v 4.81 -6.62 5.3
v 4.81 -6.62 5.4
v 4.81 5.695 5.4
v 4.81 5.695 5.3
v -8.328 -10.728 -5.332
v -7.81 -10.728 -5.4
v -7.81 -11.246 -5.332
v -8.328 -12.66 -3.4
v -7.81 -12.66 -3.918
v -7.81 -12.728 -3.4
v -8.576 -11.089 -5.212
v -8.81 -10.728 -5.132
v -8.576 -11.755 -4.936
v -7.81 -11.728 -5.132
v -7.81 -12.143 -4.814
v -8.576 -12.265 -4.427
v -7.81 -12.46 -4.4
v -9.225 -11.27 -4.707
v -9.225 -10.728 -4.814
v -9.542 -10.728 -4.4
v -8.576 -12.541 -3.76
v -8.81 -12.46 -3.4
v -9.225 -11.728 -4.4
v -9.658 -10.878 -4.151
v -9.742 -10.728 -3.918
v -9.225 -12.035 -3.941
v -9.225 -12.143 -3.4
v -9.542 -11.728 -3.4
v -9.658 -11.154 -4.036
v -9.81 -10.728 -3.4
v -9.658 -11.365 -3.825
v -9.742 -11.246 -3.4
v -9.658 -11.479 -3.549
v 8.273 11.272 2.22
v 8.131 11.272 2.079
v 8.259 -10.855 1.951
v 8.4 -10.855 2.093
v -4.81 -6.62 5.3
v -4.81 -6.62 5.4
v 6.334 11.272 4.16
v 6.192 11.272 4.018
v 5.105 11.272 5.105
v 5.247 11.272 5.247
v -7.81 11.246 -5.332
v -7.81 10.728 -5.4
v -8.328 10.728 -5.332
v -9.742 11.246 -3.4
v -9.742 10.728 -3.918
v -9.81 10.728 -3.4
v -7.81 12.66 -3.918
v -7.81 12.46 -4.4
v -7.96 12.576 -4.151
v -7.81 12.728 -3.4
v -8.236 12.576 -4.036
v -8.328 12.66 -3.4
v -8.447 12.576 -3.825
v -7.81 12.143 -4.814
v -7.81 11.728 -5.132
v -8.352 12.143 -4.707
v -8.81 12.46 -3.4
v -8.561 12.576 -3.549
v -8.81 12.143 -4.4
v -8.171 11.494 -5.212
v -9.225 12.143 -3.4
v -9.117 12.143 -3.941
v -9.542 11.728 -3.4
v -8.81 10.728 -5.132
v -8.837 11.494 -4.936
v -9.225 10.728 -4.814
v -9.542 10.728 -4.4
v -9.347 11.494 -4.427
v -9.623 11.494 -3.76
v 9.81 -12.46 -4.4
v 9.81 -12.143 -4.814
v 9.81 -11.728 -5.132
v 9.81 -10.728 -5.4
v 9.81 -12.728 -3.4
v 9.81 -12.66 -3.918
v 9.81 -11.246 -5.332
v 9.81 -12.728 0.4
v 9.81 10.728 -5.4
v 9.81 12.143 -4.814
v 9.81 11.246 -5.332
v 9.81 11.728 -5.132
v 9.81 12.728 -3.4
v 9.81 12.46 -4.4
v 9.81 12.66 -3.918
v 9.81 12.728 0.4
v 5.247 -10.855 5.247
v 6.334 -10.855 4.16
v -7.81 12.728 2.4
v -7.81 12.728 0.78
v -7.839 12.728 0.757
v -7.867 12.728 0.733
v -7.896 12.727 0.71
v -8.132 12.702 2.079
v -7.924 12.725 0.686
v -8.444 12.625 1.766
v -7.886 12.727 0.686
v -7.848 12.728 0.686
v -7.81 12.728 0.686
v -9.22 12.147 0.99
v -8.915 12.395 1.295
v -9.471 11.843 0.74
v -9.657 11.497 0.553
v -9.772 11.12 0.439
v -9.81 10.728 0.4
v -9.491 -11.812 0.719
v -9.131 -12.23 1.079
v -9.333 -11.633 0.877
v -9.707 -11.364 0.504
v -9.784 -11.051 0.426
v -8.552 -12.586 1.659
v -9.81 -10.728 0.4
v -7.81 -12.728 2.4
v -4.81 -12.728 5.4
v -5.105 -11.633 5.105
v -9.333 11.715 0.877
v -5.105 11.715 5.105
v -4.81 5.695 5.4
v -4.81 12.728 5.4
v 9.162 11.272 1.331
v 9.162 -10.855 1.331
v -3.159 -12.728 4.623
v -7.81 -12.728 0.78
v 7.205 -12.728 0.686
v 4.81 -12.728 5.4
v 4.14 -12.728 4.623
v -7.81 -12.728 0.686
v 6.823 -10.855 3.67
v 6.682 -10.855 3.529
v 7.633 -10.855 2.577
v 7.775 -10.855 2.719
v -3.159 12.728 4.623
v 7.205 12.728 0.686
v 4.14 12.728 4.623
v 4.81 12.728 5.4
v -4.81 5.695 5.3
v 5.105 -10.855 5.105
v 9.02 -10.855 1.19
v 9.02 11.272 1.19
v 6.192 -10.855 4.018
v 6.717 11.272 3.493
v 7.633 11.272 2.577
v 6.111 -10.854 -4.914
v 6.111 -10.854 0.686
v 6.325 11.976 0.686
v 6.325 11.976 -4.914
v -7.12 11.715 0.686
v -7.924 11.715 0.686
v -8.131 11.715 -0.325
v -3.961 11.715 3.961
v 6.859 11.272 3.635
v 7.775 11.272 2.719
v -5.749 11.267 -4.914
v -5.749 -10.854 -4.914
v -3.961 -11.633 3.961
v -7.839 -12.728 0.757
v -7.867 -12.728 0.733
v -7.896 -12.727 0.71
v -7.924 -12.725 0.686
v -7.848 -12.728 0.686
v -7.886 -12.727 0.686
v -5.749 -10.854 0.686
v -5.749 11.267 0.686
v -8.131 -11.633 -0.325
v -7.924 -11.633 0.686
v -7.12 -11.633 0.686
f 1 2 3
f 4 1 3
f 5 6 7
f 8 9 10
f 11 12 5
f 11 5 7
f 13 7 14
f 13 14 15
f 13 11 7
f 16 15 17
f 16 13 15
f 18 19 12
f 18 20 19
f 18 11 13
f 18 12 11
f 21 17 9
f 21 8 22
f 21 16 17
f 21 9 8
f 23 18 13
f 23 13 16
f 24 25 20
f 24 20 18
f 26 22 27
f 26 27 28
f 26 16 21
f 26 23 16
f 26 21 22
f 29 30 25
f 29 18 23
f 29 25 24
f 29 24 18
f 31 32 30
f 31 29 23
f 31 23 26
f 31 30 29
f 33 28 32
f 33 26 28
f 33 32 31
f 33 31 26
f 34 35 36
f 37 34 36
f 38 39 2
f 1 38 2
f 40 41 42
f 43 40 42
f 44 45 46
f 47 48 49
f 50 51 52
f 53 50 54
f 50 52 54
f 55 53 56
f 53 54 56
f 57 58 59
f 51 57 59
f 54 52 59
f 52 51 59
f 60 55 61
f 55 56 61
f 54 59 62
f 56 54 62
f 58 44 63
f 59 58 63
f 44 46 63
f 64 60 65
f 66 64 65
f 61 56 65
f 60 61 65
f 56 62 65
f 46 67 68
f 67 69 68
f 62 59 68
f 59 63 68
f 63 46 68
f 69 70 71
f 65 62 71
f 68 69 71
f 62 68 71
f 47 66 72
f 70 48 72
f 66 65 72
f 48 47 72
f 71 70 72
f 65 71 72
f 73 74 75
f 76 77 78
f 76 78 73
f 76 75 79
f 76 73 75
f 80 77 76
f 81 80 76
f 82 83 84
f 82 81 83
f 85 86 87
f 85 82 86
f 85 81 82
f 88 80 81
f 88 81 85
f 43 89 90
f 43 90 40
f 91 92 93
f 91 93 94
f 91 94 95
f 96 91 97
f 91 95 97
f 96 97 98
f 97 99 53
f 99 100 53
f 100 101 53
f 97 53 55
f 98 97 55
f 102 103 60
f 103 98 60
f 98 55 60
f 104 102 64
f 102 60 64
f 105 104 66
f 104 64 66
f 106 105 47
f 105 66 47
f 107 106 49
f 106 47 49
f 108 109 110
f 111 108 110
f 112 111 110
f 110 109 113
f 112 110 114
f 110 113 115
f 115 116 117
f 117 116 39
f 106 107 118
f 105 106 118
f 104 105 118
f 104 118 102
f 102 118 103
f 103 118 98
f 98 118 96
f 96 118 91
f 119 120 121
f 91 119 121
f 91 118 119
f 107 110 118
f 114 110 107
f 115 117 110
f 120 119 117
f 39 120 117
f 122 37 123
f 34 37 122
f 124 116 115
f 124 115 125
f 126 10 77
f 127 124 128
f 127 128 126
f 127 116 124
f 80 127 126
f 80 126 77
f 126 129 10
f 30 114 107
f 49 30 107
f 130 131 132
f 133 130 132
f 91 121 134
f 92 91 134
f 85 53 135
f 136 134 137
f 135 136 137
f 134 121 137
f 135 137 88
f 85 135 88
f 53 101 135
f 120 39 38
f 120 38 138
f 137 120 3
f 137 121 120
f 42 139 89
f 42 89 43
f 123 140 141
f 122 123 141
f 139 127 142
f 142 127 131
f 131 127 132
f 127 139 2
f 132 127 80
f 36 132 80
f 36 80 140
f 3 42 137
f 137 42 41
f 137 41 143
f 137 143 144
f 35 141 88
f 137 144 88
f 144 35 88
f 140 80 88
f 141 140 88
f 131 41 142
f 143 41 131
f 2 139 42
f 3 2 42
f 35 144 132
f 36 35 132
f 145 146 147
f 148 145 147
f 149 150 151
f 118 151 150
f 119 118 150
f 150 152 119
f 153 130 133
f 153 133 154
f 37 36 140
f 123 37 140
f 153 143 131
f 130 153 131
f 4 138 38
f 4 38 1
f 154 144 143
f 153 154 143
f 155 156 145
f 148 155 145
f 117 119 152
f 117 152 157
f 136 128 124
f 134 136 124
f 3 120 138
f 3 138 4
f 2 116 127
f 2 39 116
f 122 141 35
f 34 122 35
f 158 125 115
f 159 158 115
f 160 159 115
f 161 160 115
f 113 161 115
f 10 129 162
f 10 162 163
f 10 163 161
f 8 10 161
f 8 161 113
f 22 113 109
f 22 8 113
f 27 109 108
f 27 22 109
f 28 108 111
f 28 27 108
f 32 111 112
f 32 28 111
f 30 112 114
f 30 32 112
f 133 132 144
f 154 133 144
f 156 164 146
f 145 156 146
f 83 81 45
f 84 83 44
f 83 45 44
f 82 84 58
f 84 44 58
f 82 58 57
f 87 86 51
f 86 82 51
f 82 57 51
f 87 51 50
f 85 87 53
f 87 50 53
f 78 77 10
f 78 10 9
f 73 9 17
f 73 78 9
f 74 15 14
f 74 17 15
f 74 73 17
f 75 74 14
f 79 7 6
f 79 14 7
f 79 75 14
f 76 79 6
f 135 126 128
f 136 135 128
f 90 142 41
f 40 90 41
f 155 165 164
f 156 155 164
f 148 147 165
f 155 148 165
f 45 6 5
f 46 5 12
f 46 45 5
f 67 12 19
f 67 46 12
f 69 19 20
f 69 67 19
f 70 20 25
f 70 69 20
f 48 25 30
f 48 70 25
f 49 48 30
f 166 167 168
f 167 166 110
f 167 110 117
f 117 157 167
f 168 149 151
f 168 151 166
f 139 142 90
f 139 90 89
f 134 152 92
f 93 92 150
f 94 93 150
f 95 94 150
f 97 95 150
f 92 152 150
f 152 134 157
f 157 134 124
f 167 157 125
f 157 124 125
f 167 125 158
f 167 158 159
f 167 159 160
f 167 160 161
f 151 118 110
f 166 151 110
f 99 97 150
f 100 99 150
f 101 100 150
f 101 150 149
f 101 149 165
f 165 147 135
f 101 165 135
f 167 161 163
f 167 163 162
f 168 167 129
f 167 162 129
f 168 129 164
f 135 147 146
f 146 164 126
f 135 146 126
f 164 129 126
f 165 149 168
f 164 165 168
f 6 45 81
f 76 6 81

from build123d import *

# Parameters (mm, degrees)
F0_W         = 19.62069033
F0_H         = 25.4568966
F1_DEPTH     = 5.4
F2_SIZE      = 5
F3_SIZE      = 5
F4_W         = 22.1276450902
F4_H         = 1.5373004135
F5_DEPTH     = 0.2
F7_DEPTH     = 25.5
F8_W         = 23.348543793
F8_H         = 5.9792976826
F9_DEPTH     = 1.7
F10_R        = 2
F11_T1_DEPTH = 28.4568966
F11_T3_DEPTH = 8.8
F11_T6_ANGLE = 90
F12_T1_DEPTH = 22.62069033
F12_T3_DEPTH = 8.8
F12_T6_ANGLE = 90.0000000053
F14_DEPTH    = 5.6
F15_W        = 9.62069033
F15_H        = 12.3144993559
F16_DEPTH    = 0.1


# Not quite as in the source:
# - a fillet or chamfer that OpenCascade refuses, or shapes differently, is made with other operations: its cross-section is extruded or revolved along the edge and cut away or added


with BuildPart() as f1:
    # F0 (on Top) → F1 (new body, symmetric)
    with BuildSketch(Plane.XY):
        Rectangle(F0_W, F0_H)
    extrude(amount=F1_DEPTH, both=True)

    # F2
    f2_edges = [f1.edges().sort_by_distance(p)[0] for p in [
        (-9.810345, 0, 5.4),
    ]]
    chamfer(f2_edges, length=F2_SIZE)

    # F3
    f3_edges = [f1.edges().sort_by_distance(p)[0] for p in [
        (9.810345, 0, 5.4),
    ]]
    chamfer(f3_edges, length=F3_SIZE)

    # F4 (on face) → F5 (join)
    with BuildSketch(Plane(origin=(5.1051725825, 0, 5.1051725825), x_dir=(0, 1, 0), z_dir=(0.7071067812, 0, 0.7071067812))):
        with Locations((0.2083815634, -0.7686502067)):
            Rectangle(F4_W, F4_H)
        Polygon((11.2722041085, -2.2796541452), (-10.8554409817, -2.2294183727), (-10.8554409817, -3.5751299001), (11.2722041085, -3.5751299001), align=None)
        Polygon((11.2722041085, -4.2798109353), (-10.8554409817, -4.4601280242), (-10.8554409817, -5.5370246992), (11.2722041085, -5.5370246992), align=None)
    extrude(amount=F5_DEPTH)

    # F6 (on face) → F7 (cut)
    with BuildSketch(Plane.XZ.offset(12.7284483)):
        Polygon((4.140063189, 4.6230903827), (-3.1588820275, 4.6230903827), (-7.9239970073, 0.6864351453), (7.2048916481, 0.6864351453), align=None)
    extrude(amount=-F7_DEPTH, mode=Mode.SUBTRACT)

    # F8 (on face) → F9 (cut)
    with BuildSketch(Plane(origin=(-5.1051725825, 0, 5.1051725825), x_dir=(0, -1, 0), z_dir=(-0.7071067812, 0, 0.7071067812))):
        with Locations((-0.0411020592, -2.9896488413)):
            Rectangle(F8_W, F8_H)
    extrude(amount=-F9_DEPTH, mode=Mode.SUBTRACT)

    # F10
    f10_edges = [f1.edges().sort_by_distance(p)[0] for p in [
        (0, -12.728448, -5.4),
    ]]
    fillet(f10_edges, radius=F10_R)

    # F11: fillet of radius 2 on 1 edges, made by hand

    # F11_s2 → F11_t1 (cut)
    with BuildSketch(Plane.XZ.offset(-17.7284483)):
        with BuildLine():
            ThreePointArc((-7.810345165, -5.4), (-9.2245587274, -4.8142135624), (-9.810345165, -3.4))
            Line((-9.810345165, -3.4), (-9.810345165, -5.4))
            Line((-9.810345165, -5.4), (-7.810345165, -5.4))
        make_face()
    extrude(amount=F11_T1_DEPTH, mode=Mode.SUBTRACT)

    # F11_s4 → F11_t3 (cut)
    with BuildSketch(Plane.XY.offset(-3.4)):
        with BuildLine():
            ThreePointArc((-7.810345165, -12.7284483), (-9.2245587274, -12.1426618624), (-9.810345165, -10.7284483))
            Line((-9.810345165, -10.7284483), (-9.810345165, -12.7284483))
            Line((-9.810345165, -12.7284483), (-7.810345165, -12.7284483))
        make_face()
    extrude(amount=F11_T3_DEPTH, mode=Mode.SUBTRACT)

    # F11_s5 → F11_t6 (revolve, cut)
    with BuildSketch(Plane.XZ.offset(10.7284483)):
        with BuildLine():
            ThreePointArc((-7.810345165, -5.4), (-9.2245587274, -4.8142135624), (-9.810345165, -3.4))
            Line((-9.810345165, -3.4), (-9.810345165, -5.4))
            Line((-9.810345165, -5.4), (-7.810345165, -5.4))
        make_face()
    revolve(axis=Axis((-9.810345165, -10.7284483, -3.4), (-1, 0, 0)), revolution_arc=F11_T6_ANGLE, mode=Mode.SUBTRACT)

    # F12: fillet of radius 2 on 1 edges, made by hand

    # F12_s2 → F12_t1 (cut)
    with BuildSketch(Plane.YZ.offset(-7.810345165)):
        with BuildLine():
            ThreePointArc((10.7284483, -5.4), (12.1426618624, -4.8142135624), (12.7284483, -3.4))
            Line((12.7284483, -3.4), (12.7284483, -5.4))
            Line((12.7284483, -5.4), (10.7284483, -5.4))
        make_face()
    extrude(amount=F12_T1_DEPTH, mode=Mode.SUBTRACT)

    # F12_s4 → F12_t3 (cut)
    with BuildSketch(Plane.XY.offset(-3.4)):
        with BuildLine():
            ThreePointArc((-7.810345165, 12.7284483), (-9.2245587274, 12.1426618624), (-9.810345165, 10.7284483))
            Line((-9.810345165, 10.7284483), (-9.810345165, 12.7284483))
            Line((-9.810345165, 12.7284483), (-7.810345165, 12.7284483))
        make_face()
    extrude(amount=F12_T3_DEPTH, mode=Mode.SUBTRACT)

    # F12_s5 → F12_t6 (revolve, cut)
    with BuildSketch(Plane.YZ.offset(-7.8103451651)):
        with BuildLine():
            ThreePointArc((12.7284483, -3.4), (12.1426618624, -4.8142135624), (10.7284483, -5.4))
            Line((10.7284483, -5.4), (12.7284483, -5.4))
            Line((12.7284483, -5.4), (12.7284483, -3.4))
        make_face()
    revolve(axis=Axis((-7.8103451651, 12.7284483, -3.4000000001), (0, 1, 0)), revolution_arc=F12_T6_ANGLE, mode=Mode.SUBTRACT)

    # F13 (on face) → F14 (cut)
    with BuildSketch(Plane.XY.offset(0.6864351453)):
        Polygon((6.1108670197, -10.853772983), (6.3247303478, 11.9756069034), (-5.7491413318, 11.2674161792), (-5.7491413318, -10.853772983), align=None)
    extrude(amount=-F14_DEPTH, mode=Mode.SUBTRACT)

    # F15 (on face) → F16 (cut)
    with BuildSketch(Plane.XY.offset(5.4)):
        with Locations((0, -0.4627322778)):
            Rectangle(F15_W, F15_H)
    extrude(amount=-F16_DEPTH, mode=Mode.SUBTRACT)


solid = f1.part
